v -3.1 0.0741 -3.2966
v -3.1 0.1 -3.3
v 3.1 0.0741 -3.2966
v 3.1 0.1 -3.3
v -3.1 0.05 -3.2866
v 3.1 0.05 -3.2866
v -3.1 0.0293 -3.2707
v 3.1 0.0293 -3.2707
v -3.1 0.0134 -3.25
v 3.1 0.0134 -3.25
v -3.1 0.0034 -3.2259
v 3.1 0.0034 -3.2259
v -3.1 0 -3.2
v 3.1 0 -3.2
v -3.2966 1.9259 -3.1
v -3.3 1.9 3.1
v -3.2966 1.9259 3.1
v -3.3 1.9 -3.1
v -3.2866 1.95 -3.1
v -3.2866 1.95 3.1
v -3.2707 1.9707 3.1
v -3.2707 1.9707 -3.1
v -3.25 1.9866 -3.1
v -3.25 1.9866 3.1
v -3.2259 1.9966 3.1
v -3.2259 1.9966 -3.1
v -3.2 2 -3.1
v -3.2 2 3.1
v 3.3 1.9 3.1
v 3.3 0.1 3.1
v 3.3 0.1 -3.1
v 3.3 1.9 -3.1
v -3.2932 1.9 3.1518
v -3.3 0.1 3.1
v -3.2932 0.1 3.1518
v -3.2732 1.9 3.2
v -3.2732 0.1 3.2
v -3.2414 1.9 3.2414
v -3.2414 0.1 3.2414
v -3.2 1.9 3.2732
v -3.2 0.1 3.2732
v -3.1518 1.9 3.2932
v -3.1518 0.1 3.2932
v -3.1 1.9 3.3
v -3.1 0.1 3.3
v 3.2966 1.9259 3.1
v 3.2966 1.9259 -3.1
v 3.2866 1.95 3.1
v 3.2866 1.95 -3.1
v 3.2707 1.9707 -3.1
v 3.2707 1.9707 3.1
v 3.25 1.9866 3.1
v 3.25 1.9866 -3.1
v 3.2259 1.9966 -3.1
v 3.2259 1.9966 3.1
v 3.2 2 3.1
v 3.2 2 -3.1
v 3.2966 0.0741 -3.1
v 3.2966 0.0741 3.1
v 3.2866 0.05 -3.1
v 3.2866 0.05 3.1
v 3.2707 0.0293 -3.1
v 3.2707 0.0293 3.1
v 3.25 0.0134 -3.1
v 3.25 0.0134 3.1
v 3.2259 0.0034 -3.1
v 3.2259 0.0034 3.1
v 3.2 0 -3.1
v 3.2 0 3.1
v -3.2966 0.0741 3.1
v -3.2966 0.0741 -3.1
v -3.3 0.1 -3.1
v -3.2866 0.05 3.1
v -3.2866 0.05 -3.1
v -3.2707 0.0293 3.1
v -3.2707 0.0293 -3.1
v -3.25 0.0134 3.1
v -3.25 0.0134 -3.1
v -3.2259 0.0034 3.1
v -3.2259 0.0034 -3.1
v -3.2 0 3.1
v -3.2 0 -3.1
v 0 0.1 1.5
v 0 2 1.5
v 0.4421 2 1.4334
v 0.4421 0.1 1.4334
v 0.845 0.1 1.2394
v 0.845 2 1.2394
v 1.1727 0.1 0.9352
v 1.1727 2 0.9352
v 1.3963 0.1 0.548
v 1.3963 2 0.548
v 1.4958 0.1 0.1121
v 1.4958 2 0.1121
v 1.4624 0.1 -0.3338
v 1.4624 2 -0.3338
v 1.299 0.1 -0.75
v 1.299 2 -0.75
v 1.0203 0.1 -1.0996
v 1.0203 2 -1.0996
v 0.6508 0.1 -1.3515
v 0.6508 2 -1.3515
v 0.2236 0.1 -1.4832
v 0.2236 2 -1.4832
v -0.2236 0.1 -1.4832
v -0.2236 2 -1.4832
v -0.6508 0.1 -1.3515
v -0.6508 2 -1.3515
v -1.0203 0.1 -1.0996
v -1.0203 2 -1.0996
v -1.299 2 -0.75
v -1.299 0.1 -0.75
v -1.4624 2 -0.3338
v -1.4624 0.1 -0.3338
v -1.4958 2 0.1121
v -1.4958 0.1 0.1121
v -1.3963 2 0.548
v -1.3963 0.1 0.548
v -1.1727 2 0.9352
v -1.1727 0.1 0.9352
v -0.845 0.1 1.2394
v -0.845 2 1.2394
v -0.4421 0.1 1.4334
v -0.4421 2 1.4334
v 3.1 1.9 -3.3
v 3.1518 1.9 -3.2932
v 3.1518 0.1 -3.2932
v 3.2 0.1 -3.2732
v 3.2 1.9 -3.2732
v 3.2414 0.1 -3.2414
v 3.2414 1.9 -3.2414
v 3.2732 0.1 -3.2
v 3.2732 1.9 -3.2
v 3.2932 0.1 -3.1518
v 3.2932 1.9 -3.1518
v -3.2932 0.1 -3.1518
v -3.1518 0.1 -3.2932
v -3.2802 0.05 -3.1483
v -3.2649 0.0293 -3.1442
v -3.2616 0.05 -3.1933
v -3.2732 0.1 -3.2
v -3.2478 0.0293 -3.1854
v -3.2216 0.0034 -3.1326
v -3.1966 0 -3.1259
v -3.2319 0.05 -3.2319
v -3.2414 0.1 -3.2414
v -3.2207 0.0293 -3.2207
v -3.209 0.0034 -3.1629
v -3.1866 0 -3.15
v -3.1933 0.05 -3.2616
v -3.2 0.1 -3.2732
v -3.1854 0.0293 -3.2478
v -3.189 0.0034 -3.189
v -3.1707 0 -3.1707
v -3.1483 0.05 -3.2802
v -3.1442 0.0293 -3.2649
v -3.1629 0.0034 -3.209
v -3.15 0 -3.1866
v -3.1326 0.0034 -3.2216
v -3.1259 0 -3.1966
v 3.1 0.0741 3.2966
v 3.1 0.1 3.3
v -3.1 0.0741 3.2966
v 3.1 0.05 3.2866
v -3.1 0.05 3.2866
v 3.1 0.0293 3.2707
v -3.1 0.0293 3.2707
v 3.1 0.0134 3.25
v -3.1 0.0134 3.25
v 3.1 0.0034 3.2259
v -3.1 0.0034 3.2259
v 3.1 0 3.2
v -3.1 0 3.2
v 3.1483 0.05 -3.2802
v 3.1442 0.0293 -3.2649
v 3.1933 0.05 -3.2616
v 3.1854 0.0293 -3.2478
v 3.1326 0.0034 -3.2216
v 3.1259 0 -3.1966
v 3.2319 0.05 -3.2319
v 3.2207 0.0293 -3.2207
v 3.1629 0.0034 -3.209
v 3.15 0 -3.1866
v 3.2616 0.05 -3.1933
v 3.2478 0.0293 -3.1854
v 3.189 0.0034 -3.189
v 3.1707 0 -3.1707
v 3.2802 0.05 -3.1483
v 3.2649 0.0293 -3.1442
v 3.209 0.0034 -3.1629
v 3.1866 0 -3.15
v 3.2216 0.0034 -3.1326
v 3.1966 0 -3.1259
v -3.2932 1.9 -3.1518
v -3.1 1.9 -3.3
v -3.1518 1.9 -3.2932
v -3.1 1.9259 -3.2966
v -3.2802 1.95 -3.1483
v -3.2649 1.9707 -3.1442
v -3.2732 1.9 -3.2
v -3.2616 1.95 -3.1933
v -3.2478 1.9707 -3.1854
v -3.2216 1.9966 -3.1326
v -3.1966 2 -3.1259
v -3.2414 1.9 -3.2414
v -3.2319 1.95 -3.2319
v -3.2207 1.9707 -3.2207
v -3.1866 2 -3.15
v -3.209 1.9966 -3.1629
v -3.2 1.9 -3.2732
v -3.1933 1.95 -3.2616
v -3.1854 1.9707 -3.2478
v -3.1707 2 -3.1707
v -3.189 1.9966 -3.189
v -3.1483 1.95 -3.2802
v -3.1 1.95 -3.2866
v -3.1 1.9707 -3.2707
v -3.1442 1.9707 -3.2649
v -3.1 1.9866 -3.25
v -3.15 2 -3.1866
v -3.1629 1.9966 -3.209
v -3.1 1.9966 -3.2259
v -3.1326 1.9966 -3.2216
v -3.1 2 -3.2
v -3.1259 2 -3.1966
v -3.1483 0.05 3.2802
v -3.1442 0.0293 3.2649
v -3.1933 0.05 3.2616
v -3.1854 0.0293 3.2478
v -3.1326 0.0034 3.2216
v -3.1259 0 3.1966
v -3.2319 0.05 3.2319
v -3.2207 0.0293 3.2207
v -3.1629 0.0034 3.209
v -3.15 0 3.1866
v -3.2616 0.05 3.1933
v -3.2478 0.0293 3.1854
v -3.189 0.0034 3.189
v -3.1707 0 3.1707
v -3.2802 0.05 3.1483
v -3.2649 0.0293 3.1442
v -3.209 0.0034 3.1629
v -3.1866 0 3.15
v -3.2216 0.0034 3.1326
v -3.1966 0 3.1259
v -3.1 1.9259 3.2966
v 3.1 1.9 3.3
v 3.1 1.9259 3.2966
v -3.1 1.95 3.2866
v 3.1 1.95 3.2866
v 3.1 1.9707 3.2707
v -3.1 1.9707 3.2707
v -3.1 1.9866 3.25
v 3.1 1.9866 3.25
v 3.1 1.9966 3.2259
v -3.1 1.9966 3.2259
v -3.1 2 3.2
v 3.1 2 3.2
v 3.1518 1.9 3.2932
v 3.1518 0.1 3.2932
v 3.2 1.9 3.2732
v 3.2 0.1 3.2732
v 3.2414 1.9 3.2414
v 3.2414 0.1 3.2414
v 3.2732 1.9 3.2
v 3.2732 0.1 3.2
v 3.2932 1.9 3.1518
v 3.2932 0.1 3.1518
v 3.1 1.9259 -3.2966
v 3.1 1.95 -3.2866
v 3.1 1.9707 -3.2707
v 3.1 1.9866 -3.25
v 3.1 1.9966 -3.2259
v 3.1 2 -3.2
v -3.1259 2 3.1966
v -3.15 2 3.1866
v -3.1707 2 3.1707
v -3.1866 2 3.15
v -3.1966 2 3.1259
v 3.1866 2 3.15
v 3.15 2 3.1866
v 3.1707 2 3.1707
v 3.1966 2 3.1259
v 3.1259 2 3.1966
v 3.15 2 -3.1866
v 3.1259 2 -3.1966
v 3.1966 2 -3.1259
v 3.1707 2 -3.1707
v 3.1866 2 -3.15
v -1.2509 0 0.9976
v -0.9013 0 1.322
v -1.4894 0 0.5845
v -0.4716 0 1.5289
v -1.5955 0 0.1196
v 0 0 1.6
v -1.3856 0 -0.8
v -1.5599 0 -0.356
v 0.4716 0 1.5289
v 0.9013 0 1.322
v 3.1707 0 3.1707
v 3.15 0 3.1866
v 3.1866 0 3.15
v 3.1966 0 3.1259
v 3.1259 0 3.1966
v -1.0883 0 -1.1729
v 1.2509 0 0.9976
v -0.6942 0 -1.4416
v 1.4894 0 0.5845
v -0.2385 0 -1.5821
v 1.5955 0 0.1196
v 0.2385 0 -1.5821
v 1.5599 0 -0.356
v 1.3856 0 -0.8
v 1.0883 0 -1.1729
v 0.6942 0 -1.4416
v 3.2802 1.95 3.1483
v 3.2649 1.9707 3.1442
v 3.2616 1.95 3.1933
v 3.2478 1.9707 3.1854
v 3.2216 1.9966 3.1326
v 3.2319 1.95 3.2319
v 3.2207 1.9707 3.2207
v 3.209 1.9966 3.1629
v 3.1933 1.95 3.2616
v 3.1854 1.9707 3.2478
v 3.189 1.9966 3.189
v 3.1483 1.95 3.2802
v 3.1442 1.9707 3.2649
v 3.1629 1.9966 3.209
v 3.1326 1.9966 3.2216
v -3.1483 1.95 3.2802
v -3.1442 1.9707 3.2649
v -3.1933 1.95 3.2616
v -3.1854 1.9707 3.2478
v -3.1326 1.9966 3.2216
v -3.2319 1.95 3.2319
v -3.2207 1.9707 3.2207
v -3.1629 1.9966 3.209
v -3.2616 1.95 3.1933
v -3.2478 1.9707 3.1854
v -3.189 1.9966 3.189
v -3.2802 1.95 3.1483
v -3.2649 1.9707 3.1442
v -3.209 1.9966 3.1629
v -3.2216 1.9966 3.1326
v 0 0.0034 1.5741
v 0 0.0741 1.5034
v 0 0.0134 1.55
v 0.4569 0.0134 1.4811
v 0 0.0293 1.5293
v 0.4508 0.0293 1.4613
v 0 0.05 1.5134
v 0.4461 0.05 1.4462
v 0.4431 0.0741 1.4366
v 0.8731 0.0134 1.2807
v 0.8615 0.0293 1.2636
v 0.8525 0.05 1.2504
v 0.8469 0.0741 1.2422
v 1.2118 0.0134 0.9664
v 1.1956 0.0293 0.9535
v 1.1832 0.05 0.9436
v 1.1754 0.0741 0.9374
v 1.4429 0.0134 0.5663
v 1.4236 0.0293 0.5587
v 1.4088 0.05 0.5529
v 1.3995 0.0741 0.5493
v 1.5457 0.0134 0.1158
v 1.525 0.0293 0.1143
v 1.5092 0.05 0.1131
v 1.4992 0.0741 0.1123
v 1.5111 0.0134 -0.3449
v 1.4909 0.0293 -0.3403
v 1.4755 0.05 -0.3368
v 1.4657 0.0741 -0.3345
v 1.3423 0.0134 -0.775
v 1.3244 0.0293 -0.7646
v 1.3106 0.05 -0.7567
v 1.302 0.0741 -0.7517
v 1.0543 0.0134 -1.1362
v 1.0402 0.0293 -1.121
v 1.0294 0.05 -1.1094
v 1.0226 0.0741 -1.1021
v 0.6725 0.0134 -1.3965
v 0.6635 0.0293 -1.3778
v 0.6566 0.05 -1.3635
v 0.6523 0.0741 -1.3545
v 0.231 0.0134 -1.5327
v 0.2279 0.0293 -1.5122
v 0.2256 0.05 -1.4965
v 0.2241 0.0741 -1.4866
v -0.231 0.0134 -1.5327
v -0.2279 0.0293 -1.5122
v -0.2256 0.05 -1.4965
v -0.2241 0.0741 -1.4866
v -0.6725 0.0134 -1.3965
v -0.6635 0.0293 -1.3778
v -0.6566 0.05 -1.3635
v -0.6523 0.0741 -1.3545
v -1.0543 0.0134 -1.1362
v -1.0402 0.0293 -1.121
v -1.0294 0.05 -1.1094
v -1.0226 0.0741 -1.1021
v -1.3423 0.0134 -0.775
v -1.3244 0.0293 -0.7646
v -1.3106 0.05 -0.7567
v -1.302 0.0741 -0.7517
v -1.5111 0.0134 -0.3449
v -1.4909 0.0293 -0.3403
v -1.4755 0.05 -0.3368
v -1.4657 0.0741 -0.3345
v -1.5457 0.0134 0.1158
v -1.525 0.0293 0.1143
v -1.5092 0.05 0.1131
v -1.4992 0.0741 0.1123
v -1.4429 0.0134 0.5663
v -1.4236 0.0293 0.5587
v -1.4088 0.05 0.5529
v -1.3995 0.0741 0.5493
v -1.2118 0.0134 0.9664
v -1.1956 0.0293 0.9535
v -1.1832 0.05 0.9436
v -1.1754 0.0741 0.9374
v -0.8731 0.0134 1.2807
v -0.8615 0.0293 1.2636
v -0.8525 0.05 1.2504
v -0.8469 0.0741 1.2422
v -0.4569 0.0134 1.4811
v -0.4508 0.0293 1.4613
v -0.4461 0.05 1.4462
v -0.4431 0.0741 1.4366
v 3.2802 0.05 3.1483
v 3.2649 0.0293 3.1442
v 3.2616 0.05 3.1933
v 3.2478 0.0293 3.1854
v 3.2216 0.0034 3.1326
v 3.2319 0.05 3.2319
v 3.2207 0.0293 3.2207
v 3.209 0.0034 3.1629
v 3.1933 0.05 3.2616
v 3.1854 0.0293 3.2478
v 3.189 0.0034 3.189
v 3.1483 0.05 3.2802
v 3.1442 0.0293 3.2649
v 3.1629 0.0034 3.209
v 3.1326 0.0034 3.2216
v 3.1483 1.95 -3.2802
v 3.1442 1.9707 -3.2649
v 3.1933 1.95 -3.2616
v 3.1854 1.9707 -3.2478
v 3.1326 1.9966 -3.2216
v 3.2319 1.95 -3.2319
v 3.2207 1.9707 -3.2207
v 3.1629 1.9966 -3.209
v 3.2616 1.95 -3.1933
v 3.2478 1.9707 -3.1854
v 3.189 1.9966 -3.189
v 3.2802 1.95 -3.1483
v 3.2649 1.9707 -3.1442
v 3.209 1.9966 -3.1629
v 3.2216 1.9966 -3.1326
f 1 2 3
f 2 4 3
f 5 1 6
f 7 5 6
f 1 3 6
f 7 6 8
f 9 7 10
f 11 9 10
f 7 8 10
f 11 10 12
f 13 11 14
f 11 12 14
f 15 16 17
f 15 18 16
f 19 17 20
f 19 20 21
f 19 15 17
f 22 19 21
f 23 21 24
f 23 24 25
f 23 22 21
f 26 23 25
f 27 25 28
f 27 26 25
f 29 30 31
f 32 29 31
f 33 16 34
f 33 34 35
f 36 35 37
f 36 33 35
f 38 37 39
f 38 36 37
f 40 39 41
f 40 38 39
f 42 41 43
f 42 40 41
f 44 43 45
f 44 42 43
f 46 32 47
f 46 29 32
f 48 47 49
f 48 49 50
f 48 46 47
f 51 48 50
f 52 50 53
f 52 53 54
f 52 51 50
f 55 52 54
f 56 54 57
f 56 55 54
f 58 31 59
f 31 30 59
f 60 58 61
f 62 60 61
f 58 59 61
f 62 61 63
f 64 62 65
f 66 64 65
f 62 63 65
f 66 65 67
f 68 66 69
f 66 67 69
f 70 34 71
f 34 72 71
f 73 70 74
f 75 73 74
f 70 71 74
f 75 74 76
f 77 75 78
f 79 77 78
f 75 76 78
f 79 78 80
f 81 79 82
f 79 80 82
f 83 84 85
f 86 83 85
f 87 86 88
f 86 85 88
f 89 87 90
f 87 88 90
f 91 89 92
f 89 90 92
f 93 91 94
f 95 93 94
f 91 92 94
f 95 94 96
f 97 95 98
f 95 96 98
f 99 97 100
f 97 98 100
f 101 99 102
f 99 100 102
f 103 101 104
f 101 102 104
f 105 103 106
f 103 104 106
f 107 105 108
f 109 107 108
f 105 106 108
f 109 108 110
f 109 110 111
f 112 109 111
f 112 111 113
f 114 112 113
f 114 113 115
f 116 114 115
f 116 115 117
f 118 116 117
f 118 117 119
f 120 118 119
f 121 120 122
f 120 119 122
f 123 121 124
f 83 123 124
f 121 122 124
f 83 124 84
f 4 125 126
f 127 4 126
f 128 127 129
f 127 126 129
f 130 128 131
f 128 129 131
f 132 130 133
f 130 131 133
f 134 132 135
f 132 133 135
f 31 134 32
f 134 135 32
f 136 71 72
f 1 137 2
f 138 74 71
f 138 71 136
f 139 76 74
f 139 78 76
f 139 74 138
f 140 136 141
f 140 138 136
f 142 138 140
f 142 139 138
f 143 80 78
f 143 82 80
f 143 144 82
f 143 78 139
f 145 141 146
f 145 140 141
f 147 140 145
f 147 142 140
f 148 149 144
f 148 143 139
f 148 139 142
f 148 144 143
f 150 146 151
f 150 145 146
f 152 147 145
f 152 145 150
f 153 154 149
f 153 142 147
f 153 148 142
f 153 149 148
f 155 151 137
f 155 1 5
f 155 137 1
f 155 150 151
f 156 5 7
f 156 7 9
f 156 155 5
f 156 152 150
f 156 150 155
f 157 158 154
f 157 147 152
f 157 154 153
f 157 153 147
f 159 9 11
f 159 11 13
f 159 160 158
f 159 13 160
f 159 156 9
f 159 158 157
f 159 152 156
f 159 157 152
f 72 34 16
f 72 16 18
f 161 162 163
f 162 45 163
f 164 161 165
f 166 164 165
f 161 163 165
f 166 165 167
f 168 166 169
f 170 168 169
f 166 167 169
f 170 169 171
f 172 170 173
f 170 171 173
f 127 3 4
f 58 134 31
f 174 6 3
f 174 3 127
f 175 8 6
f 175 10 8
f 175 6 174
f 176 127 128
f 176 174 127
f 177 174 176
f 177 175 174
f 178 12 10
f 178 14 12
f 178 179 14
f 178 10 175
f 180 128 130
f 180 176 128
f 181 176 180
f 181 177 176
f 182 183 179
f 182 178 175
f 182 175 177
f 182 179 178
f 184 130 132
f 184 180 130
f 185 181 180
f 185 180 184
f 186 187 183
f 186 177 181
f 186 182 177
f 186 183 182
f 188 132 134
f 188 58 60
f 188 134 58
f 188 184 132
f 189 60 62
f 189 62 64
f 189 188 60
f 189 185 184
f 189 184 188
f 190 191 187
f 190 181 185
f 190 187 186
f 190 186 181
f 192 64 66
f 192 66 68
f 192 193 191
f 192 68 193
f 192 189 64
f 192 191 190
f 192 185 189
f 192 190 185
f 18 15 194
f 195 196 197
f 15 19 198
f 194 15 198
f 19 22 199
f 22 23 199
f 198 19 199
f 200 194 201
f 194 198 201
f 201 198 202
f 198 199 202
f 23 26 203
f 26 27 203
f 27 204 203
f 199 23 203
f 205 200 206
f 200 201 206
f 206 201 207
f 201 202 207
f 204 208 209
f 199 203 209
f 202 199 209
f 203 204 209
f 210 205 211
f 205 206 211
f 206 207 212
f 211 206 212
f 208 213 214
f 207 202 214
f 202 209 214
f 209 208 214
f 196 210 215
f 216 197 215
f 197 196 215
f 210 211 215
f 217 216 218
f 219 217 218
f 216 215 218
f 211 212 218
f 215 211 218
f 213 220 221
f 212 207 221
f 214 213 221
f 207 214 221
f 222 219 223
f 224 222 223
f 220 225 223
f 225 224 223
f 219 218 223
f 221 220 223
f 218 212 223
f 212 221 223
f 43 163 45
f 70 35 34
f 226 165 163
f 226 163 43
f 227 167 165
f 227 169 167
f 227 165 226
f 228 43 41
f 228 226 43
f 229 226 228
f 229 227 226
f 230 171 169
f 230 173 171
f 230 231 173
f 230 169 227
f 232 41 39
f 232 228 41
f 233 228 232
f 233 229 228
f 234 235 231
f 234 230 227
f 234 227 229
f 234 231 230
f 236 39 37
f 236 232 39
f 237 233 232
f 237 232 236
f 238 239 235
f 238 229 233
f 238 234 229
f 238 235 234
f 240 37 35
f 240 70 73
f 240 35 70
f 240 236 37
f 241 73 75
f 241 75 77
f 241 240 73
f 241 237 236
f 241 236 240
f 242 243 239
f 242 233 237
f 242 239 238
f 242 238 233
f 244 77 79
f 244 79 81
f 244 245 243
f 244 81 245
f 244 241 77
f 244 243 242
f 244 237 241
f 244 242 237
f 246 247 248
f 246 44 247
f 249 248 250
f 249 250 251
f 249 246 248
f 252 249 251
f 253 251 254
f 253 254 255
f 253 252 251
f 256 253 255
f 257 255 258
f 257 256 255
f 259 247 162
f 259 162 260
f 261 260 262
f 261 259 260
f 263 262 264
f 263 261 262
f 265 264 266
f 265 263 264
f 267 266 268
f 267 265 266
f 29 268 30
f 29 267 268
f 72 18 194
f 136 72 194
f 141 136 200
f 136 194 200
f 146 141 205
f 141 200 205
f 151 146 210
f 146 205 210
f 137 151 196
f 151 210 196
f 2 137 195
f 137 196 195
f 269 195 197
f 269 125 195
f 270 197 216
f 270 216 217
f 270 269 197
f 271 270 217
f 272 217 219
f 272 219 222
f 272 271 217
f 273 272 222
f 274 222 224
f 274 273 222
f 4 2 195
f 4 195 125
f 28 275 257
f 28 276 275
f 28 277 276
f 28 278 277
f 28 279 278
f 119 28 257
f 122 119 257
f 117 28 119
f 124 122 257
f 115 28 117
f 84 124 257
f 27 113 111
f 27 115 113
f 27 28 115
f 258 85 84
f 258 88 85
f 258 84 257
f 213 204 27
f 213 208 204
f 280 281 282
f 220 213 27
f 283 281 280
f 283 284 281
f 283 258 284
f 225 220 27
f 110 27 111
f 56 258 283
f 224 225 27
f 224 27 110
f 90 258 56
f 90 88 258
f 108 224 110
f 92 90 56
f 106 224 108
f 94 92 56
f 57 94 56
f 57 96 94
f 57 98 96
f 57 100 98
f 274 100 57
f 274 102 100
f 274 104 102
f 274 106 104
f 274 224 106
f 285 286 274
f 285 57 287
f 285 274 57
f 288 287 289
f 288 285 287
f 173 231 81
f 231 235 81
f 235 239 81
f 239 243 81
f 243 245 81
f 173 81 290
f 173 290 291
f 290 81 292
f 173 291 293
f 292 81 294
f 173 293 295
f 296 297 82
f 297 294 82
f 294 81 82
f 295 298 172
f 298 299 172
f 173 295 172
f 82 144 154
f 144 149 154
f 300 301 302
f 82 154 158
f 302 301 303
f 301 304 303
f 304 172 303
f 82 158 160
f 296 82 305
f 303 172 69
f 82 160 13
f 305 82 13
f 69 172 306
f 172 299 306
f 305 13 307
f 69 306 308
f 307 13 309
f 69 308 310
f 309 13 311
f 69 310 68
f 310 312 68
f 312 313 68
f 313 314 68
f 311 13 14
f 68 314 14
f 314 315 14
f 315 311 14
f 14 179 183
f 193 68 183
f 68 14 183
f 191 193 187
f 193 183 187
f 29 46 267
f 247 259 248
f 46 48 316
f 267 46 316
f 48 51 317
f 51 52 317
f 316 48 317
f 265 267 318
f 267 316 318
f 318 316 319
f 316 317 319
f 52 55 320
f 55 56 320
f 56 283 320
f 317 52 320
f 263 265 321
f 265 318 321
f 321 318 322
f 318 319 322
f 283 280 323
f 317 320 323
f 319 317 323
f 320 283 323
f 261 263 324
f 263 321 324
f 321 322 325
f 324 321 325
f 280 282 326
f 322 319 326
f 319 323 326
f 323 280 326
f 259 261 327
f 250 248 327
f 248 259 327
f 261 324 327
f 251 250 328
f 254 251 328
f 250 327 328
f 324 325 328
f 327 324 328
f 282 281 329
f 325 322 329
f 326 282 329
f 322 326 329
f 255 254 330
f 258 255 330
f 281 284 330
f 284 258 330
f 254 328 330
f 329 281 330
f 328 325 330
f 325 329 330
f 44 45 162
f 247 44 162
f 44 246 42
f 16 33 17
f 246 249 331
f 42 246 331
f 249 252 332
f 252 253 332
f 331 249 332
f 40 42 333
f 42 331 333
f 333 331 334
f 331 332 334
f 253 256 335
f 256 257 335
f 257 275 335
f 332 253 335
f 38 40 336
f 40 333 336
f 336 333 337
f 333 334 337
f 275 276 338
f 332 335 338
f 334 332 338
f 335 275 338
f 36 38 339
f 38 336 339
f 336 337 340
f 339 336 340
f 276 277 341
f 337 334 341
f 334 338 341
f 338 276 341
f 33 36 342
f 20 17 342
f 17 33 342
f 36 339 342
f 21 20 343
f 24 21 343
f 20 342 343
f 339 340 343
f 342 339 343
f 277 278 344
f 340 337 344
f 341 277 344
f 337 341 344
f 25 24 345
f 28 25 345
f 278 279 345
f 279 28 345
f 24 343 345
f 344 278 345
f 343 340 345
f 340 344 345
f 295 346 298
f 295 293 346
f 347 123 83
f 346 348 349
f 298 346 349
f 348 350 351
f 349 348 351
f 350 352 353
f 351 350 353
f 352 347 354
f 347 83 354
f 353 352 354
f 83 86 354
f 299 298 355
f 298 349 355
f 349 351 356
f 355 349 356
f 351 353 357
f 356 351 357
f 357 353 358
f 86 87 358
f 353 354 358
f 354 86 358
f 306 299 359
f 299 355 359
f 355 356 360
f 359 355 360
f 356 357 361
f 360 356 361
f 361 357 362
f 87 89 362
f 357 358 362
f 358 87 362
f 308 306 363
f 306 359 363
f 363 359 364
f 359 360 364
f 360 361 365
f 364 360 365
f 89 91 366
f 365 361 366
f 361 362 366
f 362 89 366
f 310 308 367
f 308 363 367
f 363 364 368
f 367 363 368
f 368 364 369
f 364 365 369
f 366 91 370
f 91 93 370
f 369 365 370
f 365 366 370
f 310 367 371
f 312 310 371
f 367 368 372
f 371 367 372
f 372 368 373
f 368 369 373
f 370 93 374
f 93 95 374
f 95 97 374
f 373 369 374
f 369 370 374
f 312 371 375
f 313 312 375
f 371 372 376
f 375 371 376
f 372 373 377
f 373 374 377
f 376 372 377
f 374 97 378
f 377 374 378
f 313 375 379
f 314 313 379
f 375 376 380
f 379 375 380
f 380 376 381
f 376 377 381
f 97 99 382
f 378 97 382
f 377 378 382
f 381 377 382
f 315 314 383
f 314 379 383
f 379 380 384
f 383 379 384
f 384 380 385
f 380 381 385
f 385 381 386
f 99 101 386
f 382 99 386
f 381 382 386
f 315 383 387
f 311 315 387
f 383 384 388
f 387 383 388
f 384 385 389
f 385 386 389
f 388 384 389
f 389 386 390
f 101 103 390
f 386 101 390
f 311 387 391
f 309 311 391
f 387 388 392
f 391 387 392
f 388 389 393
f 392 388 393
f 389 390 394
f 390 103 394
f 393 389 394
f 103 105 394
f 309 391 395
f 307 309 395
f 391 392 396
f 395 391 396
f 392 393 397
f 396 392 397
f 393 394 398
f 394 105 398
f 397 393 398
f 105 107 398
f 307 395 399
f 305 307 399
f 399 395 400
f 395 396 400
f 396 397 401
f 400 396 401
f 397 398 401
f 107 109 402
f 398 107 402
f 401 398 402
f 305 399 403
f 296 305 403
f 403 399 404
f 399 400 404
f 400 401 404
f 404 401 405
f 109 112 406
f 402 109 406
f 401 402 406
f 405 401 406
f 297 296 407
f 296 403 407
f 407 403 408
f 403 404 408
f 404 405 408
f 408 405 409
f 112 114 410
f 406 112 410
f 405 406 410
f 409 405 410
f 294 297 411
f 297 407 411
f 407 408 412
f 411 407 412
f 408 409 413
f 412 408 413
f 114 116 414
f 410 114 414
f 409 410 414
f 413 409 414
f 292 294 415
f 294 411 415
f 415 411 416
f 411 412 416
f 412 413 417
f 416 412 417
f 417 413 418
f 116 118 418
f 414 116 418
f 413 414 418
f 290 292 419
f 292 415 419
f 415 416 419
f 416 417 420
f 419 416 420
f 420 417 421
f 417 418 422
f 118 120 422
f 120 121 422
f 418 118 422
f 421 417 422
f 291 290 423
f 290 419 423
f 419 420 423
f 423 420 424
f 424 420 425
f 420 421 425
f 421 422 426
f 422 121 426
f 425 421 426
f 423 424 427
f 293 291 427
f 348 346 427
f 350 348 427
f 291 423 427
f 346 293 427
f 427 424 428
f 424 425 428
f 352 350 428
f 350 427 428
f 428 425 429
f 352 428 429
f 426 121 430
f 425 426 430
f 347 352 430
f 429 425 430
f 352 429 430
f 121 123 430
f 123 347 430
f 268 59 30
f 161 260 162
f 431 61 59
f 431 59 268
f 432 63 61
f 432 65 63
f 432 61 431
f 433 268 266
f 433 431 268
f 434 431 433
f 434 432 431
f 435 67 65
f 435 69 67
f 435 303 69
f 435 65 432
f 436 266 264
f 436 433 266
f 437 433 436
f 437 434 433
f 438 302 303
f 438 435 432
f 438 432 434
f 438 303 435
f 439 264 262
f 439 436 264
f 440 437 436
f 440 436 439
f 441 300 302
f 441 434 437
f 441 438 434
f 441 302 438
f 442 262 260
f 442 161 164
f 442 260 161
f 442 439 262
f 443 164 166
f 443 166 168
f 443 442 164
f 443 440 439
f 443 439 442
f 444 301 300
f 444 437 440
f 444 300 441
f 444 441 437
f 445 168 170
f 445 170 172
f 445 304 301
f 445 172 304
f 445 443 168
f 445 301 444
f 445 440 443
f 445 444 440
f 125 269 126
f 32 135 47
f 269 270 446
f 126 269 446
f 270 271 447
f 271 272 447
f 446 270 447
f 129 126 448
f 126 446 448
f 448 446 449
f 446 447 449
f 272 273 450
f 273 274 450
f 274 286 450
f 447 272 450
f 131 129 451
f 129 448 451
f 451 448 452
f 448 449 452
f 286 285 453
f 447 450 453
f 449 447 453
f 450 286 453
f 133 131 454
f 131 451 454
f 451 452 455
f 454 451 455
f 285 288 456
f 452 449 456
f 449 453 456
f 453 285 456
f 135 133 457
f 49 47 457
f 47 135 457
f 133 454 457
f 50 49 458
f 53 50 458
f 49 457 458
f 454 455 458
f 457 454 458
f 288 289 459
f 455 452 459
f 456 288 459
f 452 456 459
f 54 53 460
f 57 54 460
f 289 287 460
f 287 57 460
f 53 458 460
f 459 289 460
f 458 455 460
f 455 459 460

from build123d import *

# Parameters (mm, degrees)
SKETCH_1_W          = 6.6
SKETCH_1_H          = 6.6
EXTRUDE_1_DEPTH     = 2
SKETCH_2_R          = 1.5
CUT_EXTRUDE_1_DEPTH = 2
FILLET_1_R          = 0.2
FILLET_2_R          = 0.1


with BuildPart() as part:
    # 草图1 → 凸台-拉伸1 (new body)
    with BuildSketch(Plane(origin=(0, 0, 0), x_dir=(1, 0, 0), z_dir=(0, 1, 0))):
        Rectangle(SKETCH_1_W, SKETCH_1_H)
    extrude(amount=EXTRUDE_1_DEPTH)

    # 草图2 → 切除-拉伸1 (cut)
    with BuildSketch(Plane(origin=(0, 2, 0), x_dir=(1, 0, 0), z_dir=(0, 1, 0))):
        with Locations(Location((0, 0, 0), (0, 0, 270))):
            Circle(SKETCH_2_R)
    extrude(amount=-CUT_EXTRUDE_1_DEPTH, mode=Mode.SUBTRACT)

    # 圆角1
    fillet_1_edges = [part.edges().sort_by_distance(p)[0] for p in [
        (-3.3, 1, -3.3),
        (3.3, 1, -3.3),
        (3.3, 1, 3.3),
        (-3.3, 1, 3.3),
    ]]
    fillet(fillet_1_edges, radius=FILLET_1_R)

    # 圆角2
    fillet_2_edges = [part.edges().sort_by_distance(p)[0] for p in [
        (0, 0, -1.5),
        (-3.3, 0, 0),
        (-3.3, 2, 0),
        (0, 0, -3.3),
        (3.3, 0, 0),
        (0, 0, 3.3),
        (-3.241421356, 0, 3.241421356),
        (3.241421356, 0, 3.241421356),
        (3.241421356, 0, -3.241421356),
        (-3.241421356, 0, -3.241421356),
        (0, 2, -3.3),
        (0, 2, 3.3),
        (3.3, 2, 0),
        (-3.241421356, 2, 3.241421356),
        (3.241421356, 2, 3.241421356),
        (3.241421356, 2, -3.241421356),
        (-3.241421356, 2, -3.241421356),
    ]]
    fillet(fillet_2_edges, radius=FILLET_2_R)


solid = part.part
